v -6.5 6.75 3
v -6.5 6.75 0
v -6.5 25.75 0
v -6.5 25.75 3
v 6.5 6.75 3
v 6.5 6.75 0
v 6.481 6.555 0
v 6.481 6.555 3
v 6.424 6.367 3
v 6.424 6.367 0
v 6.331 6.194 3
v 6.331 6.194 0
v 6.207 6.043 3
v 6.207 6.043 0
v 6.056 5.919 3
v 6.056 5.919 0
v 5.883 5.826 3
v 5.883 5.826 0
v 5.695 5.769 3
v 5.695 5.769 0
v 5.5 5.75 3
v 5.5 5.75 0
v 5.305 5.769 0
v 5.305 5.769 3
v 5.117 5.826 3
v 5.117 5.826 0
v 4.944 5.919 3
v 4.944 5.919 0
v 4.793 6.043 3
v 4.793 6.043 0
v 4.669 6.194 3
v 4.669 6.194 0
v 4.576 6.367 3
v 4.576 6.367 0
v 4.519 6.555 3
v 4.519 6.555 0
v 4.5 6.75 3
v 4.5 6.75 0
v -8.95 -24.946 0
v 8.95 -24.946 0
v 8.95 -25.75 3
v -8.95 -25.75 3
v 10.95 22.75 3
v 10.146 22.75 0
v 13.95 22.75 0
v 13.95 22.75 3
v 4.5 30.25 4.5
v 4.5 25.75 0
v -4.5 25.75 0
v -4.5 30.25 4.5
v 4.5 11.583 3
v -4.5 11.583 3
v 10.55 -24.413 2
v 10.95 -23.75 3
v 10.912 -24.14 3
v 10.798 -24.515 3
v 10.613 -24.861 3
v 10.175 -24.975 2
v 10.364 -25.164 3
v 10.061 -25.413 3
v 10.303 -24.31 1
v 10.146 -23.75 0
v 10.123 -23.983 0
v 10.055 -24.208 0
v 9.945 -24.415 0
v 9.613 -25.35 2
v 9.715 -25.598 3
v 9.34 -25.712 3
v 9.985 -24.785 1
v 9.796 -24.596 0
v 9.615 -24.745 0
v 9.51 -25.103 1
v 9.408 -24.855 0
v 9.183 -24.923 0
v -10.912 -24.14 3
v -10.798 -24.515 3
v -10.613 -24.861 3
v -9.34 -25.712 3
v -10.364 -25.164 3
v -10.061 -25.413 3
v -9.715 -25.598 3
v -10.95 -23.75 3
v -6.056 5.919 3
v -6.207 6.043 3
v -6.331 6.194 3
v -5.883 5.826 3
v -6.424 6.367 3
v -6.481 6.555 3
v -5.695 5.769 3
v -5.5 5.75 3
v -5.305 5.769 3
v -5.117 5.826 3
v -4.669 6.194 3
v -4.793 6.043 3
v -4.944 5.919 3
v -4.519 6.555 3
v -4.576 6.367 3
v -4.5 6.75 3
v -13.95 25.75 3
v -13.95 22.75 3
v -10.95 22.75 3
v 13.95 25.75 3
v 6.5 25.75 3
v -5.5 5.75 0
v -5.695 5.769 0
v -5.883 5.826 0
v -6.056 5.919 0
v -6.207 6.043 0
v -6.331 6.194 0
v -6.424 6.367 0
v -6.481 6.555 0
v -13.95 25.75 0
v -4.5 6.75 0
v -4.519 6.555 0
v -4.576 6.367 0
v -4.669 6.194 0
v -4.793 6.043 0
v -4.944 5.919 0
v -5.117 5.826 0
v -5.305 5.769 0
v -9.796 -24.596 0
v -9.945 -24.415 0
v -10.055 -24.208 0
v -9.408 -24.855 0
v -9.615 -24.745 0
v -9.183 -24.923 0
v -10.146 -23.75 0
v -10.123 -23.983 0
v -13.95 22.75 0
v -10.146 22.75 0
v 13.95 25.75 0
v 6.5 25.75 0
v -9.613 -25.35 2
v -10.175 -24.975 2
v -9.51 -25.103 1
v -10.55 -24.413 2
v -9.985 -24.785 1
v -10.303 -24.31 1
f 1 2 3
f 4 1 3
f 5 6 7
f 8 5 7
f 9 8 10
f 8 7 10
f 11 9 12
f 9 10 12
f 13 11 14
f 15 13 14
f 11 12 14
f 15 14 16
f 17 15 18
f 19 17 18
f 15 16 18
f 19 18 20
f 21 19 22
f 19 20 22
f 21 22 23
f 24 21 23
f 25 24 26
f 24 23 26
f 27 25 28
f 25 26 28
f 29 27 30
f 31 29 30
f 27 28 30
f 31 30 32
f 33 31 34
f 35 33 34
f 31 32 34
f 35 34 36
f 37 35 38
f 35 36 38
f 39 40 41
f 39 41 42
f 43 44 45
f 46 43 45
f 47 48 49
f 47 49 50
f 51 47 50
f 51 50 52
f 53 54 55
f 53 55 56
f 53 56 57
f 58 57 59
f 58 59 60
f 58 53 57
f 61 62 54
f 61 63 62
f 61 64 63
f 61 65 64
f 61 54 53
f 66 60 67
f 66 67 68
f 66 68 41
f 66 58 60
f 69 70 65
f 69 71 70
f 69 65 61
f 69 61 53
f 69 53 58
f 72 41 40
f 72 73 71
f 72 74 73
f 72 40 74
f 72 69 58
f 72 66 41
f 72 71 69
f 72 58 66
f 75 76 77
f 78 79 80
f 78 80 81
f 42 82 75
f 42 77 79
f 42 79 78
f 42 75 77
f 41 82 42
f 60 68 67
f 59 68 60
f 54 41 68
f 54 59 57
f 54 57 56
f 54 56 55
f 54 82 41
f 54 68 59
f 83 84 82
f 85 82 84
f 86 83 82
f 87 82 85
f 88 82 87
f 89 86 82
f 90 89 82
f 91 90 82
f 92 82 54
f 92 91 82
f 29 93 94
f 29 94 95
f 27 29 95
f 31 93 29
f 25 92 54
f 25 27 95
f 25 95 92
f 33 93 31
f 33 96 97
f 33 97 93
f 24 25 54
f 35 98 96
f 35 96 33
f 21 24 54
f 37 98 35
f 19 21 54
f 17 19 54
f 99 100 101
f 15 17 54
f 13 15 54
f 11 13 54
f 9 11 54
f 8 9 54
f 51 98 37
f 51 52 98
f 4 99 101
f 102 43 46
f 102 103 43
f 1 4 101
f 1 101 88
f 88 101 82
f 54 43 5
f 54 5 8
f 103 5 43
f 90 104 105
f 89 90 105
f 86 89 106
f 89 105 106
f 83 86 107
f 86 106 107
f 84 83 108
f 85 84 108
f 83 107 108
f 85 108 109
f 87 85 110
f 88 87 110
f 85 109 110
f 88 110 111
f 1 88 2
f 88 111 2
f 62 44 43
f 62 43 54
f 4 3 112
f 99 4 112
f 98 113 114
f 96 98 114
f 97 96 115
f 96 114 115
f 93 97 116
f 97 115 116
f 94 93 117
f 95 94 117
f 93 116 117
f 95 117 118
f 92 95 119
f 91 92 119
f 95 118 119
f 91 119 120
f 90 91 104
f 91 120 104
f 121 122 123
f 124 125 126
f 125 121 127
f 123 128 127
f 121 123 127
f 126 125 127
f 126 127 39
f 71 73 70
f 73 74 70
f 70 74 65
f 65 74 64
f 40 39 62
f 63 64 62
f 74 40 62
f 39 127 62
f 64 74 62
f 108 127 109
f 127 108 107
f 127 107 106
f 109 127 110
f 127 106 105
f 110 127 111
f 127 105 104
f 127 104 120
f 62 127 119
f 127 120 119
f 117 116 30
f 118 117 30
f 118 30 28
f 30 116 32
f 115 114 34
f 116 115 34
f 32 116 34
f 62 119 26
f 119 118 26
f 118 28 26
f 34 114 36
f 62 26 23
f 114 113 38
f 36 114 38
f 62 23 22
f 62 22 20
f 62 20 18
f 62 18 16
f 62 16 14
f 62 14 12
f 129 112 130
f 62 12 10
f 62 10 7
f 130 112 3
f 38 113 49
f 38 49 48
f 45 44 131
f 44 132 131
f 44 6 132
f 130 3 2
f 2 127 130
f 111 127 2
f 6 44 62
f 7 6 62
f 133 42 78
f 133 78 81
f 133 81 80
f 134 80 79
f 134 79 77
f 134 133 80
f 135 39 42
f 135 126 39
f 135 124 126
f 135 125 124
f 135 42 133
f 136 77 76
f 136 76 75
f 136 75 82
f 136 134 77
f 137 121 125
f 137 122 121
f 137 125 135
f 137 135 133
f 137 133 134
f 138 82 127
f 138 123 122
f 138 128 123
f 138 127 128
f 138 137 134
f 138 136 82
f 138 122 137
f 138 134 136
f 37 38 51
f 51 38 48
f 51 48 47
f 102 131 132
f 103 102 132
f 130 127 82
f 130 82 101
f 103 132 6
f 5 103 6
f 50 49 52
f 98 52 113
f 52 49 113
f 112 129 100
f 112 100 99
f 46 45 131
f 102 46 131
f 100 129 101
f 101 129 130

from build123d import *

# Parameters (mm, degrees)
F0_W     = 3
F0_H     = 3
F1_DEPTH = 3
F3_DEPTH = 4.5
F4_SIZE2 = 0.803838
F4_SIZE  = 2.99999


# Not quite as in the source:
# - a fillet or chamfer is up to 0.001 mm smaller than in the source, because OpenCascade refuses the exact size


with BuildPart() as f1:
    # F0 (on Top) → F1 (new body)
    with BuildSketch(Plane.XY):
        with BuildLine():
            Line((-6.5, 25.75), (-10.95, 25.75))
            Line((-10.95, 25.75), (-10.95, 22.75))
            Line((-10.95, 22.75), (-10.95, -23.75))
            ThreePointArc((-10.95, -23.75), (-10.3642135624, -25.1642135624), (-8.95, -25.75))
            Line((-8.95, -25.75), (8.95, -25.75))
            ThreePointArc((8.95, -25.75), (10.3642135624, -25.1642135624), (10.95, -23.75))
            Line((10.95, -23.75), (10.95, 22.75))
            Line((10.95, 22.75), (10.95, 25.75))
            Line((10.95, 25.75), (6.5, 25.75))
            Line((6.5, 25.75), (6.5, 6.75))
            ThreePointArc((6.5, 6.75), (6.2071067812, 6.0428932188), (5.5, 5.75))
            ThreePointArc((5.5, 5.75), (4.7928932188, 6.0428932188), (4.5, 6.75))
            Line((4.5, 6.75), (4.5, 25.75))
            Line((4.5, 25.75), (-4.5, 25.75))
            Line((-4.5, 25.75), (-4.5, 6.75))
            ThreePointArc((-4.5, 6.75), (-4.7928932188, 6.0428932188), (-5.5, 5.75))
            ThreePointArc((-5.5, 5.75), (-6.2071067812, 6.0428932188), (-6.5, 6.75))
            Line((-6.5, 6.75), (-6.5, 25.75))
        make_face()
        with Locations((-12.45, 24.25)):
            Rectangle(F0_W, F0_H)
        with Locations((12.45, 24.25)):
            Rectangle(F0_W, F0_H)
    extrude(amount=F1_DEPTH)

    # F2 (on Right) → F3 (join, symmetric)
    with BuildSketch(Plane.YZ):
        Polygon((-25.75, 0), (25.75, 0), (30.25, 4.5), align=None)
    extrude(amount=F3_DEPTH, both=True)

    # F4 (size 3 and 0.8038475773 in the source; OpenCascade refuses exactly that, so slightly less here)
    f4_edges = [f1.edges().sort_by_distance(p)[0] for p in [
        (0, -25.75, 0),
    ]]
    f4_side = f1.faces().sort_by_distance((0, -25.75, 1.5))[0]
    chamfer(f4_edges, length=F4_SIZE, length2=F4_SIZE2, reference=f4_side)


solid = f1.part
